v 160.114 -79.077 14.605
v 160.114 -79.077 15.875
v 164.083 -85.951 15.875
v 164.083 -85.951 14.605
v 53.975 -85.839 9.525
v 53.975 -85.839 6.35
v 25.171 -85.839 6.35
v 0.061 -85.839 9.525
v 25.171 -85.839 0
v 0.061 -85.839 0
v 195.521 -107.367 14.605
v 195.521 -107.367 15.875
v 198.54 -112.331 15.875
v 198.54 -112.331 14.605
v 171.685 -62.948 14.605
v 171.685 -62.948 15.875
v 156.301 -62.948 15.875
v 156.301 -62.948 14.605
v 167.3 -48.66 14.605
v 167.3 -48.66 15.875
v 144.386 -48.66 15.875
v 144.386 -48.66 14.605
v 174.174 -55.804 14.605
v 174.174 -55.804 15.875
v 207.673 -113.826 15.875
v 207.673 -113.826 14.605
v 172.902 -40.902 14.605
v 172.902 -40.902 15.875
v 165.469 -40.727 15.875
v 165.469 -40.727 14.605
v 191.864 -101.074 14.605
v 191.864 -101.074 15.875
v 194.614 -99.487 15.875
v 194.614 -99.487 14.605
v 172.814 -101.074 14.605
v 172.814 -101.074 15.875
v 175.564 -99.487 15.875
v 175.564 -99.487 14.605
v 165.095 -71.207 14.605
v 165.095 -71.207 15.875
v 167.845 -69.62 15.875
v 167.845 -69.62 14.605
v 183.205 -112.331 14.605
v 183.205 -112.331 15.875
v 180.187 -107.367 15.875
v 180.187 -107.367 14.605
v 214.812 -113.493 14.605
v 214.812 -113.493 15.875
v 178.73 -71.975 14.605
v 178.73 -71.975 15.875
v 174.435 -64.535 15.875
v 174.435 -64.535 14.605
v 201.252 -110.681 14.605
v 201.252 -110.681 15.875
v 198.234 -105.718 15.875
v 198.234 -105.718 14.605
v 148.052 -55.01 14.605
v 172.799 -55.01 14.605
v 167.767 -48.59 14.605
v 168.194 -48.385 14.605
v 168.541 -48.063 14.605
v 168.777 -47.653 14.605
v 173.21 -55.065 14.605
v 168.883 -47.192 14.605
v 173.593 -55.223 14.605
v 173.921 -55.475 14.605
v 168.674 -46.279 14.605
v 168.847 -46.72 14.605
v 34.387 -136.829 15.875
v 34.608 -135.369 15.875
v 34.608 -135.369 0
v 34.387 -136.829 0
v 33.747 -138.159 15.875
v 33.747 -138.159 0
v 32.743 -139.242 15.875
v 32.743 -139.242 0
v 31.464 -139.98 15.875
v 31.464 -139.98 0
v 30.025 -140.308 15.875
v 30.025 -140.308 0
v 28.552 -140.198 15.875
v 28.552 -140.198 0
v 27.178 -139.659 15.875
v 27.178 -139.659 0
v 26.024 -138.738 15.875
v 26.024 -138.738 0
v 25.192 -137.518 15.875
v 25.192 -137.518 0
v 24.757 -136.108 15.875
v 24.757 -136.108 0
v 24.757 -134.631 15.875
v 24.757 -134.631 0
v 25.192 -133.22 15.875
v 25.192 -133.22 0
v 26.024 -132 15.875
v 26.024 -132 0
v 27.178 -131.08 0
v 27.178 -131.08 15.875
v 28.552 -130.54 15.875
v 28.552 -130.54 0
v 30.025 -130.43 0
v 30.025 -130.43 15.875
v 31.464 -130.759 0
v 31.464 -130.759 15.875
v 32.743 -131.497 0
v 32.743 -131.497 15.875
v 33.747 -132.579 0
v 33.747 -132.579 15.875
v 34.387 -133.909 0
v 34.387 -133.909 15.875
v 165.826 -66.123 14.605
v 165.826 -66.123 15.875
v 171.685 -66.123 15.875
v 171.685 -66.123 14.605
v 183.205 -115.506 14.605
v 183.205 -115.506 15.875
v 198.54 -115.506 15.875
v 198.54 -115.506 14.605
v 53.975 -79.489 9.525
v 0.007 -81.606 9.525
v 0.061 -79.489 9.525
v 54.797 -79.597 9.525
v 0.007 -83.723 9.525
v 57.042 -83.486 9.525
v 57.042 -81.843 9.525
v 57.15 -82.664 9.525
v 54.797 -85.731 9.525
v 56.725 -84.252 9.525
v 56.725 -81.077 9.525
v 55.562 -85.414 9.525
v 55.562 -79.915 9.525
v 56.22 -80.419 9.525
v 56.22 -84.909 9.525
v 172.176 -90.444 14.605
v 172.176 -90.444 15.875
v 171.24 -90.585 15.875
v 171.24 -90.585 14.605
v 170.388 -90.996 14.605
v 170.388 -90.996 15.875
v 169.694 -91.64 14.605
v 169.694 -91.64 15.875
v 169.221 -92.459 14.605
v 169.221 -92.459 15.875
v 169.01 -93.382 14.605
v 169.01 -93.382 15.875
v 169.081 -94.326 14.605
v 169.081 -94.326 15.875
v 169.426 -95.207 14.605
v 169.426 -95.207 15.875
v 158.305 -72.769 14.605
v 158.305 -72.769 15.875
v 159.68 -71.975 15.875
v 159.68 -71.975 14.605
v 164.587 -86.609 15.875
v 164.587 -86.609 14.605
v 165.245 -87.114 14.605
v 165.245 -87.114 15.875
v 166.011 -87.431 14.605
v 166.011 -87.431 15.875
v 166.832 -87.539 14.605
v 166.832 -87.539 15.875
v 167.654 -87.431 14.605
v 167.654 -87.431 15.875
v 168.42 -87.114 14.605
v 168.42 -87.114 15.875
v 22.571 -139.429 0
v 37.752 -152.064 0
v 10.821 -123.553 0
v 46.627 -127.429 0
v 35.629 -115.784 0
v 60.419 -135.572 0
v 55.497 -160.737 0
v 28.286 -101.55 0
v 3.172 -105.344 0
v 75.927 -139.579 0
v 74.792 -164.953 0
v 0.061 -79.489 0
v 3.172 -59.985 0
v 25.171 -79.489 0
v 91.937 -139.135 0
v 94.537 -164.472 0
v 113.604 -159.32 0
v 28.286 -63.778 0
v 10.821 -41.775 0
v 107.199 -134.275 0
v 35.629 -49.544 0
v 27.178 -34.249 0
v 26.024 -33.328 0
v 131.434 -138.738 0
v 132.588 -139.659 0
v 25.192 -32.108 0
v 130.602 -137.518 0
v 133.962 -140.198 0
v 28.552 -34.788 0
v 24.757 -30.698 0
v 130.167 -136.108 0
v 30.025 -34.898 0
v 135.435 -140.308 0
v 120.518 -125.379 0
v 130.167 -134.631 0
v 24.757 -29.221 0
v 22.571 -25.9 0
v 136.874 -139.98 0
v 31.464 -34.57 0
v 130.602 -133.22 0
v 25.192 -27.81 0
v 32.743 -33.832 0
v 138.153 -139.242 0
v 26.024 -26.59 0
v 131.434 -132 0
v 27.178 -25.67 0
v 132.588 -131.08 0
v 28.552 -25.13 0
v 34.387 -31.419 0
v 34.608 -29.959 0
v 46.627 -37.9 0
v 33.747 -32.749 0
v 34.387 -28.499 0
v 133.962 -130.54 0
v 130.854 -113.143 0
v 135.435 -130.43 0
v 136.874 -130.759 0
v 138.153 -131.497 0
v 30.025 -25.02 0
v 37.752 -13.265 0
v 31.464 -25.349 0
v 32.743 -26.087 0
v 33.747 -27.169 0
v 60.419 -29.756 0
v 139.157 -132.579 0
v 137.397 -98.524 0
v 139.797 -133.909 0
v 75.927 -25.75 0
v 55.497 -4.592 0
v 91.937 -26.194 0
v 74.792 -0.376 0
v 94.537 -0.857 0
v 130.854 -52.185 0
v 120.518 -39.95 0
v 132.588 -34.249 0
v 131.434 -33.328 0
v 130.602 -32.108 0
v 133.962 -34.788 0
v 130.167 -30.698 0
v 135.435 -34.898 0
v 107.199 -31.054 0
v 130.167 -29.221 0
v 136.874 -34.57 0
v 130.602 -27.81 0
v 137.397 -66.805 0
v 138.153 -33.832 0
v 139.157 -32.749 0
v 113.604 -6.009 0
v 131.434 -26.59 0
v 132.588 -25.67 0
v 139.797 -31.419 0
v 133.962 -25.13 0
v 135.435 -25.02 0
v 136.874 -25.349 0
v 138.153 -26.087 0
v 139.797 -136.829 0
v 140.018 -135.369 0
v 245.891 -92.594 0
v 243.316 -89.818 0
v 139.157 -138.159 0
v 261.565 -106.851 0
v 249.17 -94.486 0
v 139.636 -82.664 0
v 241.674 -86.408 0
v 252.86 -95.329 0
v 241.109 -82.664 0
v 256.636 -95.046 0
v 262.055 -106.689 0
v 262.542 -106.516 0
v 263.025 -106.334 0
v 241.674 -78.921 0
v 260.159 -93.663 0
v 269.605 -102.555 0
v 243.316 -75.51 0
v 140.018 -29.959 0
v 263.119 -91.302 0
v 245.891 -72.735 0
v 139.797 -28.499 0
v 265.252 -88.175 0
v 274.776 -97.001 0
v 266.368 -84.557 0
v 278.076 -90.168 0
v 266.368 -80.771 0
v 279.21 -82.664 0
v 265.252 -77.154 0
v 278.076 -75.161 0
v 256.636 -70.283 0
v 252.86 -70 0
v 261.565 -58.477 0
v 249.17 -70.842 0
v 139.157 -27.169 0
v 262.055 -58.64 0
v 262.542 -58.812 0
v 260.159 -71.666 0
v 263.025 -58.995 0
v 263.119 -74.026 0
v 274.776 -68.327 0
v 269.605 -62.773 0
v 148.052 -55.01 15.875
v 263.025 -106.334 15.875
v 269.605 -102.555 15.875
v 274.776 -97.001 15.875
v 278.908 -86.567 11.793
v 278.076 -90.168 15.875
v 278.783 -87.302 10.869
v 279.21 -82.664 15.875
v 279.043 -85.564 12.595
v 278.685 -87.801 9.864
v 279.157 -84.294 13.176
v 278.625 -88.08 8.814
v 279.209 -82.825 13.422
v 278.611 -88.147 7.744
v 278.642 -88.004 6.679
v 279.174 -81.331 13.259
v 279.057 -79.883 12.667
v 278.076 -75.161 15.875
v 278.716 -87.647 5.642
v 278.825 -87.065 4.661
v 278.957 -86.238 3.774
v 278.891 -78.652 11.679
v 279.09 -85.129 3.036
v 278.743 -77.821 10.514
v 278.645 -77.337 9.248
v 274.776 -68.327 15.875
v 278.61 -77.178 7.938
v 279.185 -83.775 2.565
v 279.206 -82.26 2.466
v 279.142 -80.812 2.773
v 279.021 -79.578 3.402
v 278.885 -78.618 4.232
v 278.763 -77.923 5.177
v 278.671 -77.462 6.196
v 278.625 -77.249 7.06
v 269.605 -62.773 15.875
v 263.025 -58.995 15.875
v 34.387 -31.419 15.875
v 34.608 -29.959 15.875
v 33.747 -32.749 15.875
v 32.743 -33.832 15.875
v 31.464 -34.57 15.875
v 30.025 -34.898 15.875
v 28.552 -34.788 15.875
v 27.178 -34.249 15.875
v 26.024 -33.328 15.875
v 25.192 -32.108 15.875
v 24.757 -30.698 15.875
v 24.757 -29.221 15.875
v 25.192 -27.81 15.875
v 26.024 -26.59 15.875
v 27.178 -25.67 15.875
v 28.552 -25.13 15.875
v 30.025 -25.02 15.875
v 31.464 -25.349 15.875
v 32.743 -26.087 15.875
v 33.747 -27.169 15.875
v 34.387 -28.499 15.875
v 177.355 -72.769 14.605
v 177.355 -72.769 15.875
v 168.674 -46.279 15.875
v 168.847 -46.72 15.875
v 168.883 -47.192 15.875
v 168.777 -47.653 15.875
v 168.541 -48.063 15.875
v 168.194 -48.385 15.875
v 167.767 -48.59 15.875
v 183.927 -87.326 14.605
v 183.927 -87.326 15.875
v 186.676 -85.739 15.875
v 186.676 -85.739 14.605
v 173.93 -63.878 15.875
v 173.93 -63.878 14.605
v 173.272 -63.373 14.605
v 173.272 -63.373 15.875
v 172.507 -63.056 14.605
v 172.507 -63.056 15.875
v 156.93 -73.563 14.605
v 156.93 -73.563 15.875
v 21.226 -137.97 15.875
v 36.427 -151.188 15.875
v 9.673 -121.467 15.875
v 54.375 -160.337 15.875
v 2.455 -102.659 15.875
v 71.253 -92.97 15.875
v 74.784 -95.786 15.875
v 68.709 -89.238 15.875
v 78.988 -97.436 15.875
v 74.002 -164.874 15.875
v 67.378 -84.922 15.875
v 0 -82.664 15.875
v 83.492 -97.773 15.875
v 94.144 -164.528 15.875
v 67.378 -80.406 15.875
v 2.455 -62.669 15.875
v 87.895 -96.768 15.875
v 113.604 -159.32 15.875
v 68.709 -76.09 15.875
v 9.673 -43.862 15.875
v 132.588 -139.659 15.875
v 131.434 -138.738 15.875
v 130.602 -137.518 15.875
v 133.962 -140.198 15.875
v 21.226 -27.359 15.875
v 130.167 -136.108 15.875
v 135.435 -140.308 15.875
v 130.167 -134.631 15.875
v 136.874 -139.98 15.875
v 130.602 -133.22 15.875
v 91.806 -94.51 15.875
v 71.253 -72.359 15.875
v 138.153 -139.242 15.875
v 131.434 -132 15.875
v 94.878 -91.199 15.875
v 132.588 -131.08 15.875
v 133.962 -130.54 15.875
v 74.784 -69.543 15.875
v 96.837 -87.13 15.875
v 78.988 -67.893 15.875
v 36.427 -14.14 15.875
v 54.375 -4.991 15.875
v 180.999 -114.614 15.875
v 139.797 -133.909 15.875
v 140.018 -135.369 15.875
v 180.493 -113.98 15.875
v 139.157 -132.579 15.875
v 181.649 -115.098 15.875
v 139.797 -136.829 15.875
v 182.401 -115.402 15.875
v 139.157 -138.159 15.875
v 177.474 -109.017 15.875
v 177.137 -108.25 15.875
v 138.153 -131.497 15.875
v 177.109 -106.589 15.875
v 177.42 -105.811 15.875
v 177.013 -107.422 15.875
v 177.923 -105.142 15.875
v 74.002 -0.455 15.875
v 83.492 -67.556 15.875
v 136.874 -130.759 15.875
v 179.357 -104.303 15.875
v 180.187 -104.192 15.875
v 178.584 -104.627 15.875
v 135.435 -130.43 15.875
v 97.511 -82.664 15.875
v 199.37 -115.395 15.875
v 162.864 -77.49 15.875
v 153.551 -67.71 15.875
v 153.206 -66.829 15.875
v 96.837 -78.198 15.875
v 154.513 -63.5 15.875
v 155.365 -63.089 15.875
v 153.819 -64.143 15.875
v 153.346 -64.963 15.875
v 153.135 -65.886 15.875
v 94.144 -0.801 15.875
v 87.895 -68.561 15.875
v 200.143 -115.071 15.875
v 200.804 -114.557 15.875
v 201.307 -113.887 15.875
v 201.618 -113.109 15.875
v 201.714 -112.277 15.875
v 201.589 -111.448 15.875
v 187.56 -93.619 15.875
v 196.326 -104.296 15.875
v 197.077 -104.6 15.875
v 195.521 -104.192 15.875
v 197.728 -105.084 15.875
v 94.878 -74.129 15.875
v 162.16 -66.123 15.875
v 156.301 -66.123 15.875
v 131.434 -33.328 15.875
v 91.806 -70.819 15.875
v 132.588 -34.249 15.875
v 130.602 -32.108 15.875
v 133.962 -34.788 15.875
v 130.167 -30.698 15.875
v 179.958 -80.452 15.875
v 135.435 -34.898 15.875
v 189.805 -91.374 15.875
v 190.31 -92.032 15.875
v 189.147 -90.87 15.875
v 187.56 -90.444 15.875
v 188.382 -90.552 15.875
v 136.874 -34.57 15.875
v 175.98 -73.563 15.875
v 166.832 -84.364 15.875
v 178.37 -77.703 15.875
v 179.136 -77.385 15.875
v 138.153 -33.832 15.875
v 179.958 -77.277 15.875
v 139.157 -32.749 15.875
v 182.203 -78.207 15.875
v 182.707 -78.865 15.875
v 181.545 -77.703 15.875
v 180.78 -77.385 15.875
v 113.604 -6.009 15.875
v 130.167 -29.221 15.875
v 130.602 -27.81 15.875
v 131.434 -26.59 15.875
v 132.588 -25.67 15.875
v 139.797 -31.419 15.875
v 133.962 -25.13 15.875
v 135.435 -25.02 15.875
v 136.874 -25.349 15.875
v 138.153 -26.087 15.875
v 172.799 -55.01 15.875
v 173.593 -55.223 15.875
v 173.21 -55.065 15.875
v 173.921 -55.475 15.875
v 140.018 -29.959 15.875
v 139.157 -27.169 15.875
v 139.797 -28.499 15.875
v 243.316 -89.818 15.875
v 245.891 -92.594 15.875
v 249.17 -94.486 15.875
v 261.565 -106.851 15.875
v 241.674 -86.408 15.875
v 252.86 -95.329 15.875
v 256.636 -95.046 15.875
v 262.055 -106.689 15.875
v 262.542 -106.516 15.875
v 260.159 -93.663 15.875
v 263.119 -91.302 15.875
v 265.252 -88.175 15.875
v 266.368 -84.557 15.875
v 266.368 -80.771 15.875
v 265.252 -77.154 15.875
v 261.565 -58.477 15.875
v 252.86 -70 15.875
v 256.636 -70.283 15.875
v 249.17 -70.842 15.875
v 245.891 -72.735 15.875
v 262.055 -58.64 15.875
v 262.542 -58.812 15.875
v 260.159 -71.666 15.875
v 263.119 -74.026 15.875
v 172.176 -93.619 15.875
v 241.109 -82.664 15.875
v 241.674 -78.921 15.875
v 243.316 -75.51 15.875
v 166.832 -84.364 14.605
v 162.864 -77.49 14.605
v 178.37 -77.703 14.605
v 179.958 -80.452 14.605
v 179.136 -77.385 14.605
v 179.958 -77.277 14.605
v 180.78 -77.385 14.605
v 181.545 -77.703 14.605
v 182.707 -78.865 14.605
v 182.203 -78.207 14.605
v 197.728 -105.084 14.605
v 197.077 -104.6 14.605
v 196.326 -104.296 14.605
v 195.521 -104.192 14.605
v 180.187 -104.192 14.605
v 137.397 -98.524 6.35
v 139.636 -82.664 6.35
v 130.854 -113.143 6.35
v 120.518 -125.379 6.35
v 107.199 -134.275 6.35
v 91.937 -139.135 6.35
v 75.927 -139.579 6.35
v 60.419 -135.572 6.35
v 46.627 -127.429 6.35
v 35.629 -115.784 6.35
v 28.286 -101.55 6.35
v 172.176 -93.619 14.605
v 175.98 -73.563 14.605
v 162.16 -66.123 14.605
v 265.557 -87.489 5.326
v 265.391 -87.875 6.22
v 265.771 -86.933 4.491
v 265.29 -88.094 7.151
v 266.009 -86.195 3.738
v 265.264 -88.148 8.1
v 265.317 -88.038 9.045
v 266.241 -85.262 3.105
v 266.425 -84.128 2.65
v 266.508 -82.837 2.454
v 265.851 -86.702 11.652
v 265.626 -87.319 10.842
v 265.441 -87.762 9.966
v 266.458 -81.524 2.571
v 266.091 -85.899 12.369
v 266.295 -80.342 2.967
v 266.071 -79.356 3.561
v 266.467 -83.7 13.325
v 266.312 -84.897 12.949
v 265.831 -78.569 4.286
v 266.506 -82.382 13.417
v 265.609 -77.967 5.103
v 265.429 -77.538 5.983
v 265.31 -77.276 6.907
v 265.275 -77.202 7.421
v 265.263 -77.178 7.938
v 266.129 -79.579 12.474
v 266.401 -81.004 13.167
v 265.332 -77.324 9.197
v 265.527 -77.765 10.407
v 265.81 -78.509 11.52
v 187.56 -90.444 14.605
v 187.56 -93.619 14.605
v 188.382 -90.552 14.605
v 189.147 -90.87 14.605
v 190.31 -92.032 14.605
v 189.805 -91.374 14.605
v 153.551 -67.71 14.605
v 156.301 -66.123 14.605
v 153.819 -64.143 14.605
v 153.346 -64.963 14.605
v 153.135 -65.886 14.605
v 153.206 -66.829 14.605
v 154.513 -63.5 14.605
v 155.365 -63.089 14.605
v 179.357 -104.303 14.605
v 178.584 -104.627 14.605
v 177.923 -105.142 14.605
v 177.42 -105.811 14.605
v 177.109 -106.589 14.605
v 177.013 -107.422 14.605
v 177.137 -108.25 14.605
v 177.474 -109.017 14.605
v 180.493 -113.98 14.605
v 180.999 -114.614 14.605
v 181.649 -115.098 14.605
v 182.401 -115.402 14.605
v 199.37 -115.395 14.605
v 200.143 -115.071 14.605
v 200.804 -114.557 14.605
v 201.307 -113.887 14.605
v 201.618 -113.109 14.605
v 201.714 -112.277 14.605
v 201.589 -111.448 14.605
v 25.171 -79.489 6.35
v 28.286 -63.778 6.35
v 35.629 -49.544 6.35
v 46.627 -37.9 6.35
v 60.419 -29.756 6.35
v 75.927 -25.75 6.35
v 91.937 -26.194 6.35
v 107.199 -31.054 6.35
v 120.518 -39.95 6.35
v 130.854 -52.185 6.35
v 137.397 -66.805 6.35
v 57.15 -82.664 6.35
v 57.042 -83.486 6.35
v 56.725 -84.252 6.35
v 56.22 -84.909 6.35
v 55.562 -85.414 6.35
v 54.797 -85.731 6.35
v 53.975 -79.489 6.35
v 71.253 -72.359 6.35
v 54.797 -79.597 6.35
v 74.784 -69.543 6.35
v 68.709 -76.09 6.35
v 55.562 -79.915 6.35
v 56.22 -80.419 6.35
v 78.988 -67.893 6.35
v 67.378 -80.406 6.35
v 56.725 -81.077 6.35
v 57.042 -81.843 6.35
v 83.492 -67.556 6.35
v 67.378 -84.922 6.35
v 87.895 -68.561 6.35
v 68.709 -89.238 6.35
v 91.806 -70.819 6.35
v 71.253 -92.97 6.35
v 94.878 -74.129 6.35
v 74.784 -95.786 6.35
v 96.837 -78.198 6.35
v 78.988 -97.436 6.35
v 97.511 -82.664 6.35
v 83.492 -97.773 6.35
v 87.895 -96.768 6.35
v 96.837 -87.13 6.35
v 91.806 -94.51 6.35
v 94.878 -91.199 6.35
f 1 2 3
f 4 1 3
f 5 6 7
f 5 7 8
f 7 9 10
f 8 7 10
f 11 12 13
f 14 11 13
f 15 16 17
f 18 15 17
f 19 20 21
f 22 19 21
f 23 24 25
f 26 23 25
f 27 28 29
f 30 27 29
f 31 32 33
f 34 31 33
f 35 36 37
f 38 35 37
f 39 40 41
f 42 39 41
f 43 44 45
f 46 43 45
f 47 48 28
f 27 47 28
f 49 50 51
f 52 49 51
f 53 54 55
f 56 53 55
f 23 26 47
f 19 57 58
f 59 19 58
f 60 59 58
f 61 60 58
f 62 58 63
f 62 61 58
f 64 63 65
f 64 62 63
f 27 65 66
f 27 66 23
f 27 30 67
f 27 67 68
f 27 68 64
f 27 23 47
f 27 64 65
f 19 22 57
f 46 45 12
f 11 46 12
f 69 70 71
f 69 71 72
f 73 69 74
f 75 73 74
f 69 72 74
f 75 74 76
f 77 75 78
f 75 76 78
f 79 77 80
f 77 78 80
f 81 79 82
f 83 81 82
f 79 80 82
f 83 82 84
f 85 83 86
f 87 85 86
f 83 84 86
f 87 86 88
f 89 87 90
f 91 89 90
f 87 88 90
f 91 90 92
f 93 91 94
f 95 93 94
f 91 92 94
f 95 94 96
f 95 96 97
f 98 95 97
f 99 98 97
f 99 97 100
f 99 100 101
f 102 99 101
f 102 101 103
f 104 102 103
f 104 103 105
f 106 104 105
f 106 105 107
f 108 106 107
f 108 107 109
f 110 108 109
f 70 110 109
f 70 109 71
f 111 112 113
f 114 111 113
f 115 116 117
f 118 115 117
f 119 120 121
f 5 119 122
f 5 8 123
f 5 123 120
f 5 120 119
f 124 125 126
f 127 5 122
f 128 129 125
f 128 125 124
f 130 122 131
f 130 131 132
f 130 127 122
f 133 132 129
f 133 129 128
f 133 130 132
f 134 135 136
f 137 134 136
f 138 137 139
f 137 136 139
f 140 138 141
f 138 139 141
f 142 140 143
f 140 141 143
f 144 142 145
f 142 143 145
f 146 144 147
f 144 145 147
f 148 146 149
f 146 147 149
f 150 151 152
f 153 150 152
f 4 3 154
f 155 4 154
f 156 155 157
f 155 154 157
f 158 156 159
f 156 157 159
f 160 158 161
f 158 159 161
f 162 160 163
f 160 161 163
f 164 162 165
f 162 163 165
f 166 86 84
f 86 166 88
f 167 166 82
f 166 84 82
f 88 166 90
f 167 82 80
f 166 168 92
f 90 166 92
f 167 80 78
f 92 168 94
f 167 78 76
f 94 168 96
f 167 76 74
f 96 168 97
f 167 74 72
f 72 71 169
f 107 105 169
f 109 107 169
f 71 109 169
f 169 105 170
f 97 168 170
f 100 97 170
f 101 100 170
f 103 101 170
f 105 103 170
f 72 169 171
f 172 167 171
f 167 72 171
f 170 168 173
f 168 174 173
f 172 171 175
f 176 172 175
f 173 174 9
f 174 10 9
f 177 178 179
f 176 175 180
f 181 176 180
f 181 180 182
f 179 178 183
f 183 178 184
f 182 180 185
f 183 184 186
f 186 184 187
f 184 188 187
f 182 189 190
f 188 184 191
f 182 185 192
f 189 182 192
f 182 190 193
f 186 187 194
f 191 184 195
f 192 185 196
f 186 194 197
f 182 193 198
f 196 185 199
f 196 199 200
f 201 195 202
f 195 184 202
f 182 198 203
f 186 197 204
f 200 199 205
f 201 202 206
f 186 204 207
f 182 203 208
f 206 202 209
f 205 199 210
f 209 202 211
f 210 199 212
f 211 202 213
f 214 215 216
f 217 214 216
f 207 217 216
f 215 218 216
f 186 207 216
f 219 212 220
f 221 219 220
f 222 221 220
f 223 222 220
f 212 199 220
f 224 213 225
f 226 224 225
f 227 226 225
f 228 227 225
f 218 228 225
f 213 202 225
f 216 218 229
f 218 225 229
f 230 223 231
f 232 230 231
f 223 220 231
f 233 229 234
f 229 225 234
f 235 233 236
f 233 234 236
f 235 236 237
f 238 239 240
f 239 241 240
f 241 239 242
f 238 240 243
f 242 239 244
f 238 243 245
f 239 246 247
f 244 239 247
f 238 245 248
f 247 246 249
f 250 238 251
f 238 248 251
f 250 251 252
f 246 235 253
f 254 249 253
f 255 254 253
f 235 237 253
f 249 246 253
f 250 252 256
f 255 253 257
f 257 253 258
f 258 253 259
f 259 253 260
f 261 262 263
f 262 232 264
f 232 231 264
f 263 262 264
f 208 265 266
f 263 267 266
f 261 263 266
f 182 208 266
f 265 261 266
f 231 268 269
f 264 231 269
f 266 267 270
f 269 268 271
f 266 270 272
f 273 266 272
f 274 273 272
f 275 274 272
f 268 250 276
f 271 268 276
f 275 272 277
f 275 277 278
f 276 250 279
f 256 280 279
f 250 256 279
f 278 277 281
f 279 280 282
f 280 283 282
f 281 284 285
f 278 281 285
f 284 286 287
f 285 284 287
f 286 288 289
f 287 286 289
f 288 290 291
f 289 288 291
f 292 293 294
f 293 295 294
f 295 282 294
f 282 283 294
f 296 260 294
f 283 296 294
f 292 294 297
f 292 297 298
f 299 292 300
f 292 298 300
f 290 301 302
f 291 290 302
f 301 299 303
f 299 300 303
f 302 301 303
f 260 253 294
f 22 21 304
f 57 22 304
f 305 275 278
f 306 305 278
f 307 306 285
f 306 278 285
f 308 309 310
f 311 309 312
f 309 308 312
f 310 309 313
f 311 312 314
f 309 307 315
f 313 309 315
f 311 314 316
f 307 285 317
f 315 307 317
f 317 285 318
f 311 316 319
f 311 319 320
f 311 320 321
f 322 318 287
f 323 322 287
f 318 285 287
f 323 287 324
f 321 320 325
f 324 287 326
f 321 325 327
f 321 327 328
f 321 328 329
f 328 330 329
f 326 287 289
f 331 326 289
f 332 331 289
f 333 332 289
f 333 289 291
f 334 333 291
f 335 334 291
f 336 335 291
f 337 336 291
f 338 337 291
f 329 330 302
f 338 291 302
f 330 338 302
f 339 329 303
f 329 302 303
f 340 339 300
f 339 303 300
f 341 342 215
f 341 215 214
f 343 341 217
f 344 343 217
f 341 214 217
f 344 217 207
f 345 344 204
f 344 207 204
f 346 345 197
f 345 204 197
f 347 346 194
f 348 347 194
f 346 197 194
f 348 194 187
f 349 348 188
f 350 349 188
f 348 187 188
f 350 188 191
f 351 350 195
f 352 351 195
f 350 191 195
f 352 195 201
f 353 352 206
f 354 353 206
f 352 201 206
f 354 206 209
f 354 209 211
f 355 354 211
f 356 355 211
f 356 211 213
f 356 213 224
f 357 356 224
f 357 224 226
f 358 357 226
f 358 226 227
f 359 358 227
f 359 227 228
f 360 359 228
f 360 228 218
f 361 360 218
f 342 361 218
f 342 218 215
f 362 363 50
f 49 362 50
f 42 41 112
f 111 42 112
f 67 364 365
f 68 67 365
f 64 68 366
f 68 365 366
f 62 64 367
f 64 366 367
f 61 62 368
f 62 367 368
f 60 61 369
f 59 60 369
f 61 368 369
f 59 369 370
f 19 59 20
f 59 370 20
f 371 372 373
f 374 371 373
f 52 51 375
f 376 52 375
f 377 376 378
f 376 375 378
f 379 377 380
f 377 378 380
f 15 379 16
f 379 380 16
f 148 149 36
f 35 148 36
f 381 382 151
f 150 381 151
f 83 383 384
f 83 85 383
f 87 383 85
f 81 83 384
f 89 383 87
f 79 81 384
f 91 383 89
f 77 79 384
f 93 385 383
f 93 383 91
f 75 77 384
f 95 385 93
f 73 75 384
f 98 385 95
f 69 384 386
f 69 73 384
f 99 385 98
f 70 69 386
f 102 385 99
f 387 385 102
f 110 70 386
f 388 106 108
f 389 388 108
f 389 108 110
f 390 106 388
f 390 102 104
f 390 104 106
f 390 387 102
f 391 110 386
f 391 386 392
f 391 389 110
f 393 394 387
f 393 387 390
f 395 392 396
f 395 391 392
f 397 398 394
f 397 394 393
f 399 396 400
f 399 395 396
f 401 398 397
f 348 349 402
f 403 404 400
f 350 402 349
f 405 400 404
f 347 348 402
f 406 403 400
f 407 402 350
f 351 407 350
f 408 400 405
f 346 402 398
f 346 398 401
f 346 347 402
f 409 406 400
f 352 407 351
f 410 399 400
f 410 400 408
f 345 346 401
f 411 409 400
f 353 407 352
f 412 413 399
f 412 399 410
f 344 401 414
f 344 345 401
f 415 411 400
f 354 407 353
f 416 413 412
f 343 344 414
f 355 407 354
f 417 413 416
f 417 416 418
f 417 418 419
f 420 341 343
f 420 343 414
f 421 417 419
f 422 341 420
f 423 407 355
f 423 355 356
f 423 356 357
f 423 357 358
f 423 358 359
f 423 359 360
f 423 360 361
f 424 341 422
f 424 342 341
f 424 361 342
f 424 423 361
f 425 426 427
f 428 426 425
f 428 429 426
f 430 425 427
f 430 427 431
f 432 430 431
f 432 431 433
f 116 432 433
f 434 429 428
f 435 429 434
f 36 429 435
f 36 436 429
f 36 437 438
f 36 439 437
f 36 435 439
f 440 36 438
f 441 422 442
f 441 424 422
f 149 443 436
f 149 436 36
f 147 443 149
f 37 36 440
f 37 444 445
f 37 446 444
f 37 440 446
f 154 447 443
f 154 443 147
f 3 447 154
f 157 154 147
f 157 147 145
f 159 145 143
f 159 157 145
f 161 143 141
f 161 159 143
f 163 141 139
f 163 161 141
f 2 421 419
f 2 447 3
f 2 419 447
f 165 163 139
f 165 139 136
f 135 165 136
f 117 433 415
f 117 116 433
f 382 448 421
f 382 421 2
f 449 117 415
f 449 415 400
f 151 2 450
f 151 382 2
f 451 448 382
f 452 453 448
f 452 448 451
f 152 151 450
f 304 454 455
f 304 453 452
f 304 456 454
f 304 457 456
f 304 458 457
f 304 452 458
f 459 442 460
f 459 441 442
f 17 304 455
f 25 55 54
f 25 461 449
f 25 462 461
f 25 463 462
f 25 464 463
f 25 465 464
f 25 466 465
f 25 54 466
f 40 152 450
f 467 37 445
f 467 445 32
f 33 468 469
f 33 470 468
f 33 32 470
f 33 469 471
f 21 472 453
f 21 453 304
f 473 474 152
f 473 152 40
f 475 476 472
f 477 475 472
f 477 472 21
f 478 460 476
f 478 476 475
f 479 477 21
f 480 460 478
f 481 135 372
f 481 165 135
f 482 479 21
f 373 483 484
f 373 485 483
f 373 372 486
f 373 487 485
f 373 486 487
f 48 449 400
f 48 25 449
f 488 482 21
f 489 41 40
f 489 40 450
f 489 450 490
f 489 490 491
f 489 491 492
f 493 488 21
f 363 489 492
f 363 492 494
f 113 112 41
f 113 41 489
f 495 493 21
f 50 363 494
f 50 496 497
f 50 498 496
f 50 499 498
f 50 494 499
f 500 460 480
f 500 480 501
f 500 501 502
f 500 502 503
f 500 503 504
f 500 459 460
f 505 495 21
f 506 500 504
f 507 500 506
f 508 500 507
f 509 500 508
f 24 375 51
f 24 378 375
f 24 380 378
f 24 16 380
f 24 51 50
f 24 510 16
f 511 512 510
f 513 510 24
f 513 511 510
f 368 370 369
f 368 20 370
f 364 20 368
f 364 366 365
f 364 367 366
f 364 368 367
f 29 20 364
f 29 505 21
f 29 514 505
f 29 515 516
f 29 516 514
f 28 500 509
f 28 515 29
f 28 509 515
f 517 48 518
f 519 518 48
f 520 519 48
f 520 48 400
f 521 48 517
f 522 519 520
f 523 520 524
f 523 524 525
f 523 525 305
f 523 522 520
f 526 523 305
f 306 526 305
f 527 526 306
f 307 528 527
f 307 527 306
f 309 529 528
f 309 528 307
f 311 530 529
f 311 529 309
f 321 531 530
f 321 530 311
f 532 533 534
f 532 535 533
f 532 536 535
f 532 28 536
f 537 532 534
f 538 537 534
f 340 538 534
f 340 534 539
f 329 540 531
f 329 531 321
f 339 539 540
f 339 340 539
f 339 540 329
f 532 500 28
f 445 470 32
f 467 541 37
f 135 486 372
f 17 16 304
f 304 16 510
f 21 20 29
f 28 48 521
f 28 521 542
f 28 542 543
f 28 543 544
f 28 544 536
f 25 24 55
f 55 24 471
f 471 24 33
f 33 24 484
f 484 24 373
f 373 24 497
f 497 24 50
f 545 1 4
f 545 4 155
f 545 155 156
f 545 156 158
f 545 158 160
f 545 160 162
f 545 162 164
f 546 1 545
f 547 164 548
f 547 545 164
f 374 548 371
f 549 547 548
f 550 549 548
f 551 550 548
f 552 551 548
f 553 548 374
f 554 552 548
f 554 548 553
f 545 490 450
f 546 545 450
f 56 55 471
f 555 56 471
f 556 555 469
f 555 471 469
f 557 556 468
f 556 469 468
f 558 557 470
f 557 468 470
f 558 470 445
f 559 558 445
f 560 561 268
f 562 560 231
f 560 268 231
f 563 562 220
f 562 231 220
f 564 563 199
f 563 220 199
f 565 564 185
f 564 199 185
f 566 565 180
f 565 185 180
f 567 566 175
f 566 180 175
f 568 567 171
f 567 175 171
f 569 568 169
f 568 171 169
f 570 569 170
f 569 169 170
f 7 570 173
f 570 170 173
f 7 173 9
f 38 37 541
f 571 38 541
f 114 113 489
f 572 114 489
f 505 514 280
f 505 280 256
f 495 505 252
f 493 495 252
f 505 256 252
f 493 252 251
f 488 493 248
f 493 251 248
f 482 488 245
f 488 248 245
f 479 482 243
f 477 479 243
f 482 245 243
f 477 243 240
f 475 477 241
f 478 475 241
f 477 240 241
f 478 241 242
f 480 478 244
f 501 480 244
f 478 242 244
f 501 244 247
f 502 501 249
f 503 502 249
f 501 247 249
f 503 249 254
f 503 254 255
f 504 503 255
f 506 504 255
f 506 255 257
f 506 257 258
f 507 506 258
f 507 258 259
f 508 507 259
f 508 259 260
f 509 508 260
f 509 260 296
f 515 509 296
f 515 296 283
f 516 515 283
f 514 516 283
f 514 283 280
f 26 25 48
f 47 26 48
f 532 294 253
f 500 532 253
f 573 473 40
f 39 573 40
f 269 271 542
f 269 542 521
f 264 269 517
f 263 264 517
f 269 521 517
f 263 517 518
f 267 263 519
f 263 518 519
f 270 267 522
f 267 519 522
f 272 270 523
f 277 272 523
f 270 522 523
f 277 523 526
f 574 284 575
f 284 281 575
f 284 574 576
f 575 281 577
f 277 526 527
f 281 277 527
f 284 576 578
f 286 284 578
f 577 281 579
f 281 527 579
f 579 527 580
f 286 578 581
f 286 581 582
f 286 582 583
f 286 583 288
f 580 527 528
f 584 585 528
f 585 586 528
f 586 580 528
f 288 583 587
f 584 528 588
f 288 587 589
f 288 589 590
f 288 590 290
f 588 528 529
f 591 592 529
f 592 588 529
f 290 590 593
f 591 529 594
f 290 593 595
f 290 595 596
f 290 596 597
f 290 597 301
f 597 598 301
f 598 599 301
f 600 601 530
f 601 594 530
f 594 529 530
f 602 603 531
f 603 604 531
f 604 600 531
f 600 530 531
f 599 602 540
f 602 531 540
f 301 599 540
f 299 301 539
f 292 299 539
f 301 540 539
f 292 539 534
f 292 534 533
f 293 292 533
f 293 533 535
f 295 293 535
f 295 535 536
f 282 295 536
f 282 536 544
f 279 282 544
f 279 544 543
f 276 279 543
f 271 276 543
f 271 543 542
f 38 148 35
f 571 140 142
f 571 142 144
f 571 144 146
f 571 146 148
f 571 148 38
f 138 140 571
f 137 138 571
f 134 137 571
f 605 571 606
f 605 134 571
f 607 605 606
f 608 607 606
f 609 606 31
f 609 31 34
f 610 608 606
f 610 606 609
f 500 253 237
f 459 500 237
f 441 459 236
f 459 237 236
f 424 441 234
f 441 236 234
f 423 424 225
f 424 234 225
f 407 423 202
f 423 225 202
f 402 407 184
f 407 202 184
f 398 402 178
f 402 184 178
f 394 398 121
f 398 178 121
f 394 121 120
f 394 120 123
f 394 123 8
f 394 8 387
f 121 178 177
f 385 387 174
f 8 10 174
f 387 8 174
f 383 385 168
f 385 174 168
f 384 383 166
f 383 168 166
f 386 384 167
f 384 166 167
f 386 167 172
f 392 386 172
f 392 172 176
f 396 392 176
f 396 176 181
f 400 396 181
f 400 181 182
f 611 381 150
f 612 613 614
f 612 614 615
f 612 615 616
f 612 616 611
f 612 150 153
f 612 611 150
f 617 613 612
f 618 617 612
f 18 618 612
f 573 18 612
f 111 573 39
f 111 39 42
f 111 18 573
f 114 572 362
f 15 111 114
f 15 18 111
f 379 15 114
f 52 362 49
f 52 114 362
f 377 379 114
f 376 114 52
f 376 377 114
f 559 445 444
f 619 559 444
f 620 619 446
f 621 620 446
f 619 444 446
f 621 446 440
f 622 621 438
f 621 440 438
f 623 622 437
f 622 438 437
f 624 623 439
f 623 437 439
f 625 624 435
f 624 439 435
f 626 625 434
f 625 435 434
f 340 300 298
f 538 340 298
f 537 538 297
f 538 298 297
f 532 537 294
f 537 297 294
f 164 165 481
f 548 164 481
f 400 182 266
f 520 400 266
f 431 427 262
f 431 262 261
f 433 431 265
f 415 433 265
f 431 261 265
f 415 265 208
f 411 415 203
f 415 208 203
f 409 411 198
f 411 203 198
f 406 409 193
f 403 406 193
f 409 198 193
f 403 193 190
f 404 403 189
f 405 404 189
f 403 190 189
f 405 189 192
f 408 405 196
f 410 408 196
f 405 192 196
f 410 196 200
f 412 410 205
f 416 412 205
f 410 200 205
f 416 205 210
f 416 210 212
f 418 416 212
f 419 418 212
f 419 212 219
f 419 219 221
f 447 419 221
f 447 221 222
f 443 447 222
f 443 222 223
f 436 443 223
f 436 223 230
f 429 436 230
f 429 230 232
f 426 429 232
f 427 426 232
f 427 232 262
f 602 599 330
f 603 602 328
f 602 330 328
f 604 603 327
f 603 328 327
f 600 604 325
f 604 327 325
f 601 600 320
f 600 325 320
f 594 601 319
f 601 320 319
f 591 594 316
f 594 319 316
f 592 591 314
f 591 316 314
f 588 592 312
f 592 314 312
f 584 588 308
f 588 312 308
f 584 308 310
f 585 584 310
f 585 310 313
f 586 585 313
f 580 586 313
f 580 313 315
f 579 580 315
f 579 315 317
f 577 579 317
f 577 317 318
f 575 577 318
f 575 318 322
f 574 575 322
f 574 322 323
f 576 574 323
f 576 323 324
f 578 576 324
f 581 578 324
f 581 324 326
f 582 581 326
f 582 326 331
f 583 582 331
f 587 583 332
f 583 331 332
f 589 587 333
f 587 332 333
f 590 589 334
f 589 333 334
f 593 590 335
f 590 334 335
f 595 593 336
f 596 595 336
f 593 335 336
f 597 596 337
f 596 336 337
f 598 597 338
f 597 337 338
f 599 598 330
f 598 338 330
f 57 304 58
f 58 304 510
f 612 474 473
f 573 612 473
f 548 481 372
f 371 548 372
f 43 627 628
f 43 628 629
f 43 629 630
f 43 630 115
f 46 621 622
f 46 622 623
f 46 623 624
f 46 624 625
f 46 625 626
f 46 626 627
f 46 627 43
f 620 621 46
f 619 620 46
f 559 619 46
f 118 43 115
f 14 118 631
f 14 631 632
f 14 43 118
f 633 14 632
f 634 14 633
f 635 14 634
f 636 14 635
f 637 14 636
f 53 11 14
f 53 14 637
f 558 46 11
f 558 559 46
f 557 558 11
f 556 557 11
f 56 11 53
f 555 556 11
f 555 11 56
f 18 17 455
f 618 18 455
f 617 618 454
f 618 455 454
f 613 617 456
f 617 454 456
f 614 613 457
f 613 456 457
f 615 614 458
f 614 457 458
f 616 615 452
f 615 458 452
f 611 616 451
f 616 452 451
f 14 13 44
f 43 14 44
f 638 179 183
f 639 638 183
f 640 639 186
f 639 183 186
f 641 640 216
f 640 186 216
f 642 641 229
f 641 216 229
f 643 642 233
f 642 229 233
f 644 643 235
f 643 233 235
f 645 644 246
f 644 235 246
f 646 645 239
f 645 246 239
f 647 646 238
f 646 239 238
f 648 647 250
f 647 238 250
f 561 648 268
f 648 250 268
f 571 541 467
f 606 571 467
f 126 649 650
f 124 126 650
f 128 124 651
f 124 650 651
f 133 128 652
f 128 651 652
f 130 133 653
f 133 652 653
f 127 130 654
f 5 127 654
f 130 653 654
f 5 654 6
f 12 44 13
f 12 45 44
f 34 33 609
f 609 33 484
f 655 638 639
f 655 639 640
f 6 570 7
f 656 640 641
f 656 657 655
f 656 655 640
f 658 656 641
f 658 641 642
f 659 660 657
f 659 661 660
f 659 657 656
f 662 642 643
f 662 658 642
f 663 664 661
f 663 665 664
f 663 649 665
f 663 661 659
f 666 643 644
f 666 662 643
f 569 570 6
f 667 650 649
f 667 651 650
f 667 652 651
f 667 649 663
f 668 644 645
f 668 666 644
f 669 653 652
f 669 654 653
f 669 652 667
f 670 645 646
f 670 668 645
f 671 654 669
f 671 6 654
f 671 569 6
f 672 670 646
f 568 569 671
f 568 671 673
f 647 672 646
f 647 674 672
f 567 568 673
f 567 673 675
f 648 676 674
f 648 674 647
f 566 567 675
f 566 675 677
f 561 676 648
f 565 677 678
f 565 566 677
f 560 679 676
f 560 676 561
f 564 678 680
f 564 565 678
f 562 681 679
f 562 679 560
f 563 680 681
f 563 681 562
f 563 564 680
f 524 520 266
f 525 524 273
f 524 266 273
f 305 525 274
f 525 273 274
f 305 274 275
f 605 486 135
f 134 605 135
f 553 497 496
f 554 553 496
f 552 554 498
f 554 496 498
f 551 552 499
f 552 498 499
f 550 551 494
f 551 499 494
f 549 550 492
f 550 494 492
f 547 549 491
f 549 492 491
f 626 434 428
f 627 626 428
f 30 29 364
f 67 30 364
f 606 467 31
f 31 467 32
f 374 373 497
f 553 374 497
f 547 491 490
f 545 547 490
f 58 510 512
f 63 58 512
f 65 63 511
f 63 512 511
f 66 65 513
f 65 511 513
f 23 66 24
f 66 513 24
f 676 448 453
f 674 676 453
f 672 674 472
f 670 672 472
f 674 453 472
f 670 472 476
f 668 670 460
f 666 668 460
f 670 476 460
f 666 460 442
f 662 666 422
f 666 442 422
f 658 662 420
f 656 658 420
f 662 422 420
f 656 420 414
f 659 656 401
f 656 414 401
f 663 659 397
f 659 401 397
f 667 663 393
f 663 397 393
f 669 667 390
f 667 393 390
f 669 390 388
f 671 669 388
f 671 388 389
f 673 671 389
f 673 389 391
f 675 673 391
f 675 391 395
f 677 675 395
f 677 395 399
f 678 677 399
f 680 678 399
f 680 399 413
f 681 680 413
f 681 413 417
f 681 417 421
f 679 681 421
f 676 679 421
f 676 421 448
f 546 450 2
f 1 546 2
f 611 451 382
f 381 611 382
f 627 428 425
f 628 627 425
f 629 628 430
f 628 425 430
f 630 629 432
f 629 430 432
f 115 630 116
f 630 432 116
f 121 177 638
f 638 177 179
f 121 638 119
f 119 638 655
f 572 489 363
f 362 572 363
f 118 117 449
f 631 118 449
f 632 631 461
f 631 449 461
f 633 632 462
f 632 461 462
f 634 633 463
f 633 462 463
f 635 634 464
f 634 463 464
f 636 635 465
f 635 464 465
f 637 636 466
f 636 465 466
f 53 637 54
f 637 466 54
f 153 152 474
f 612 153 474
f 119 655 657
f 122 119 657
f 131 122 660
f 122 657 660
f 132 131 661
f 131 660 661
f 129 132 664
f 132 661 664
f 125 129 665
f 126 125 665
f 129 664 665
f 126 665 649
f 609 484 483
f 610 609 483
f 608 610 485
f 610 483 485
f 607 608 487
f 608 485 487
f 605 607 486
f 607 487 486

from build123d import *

# Parameters (mm, degrees)
F1_DEPTH  = 15.875
F3_DEPTH  = 15.876
F4_R      = 15.1511
F5_DEPTH  = 15.876
F6_R      = 57.277
F7_DEPTH  = 6.35
F8_R      = 4.953
F9_DEPTH  = 15.876
F11_DEPTH = 9.525
F13_R     = 5.4864
F14_DEPTH = 15.875
F16_DEPTH = 1.27


with BuildPart() as f1:
    # F0 (on Top) → F1 (new body)
    with BuildSketch(Plane.XY):
        with BuildLine():
            Line((261.564905, -58.477244), (113.604486, -6.008632))
            ThreePointArc((113.604486, -6.008632), (0, -82.6643), (113.604486, -159.319968))
            Line((113.604486, -159.319968), (261.564905, -106.851356))
            Line((261.564905, -106.851356), (263.024603, -106.333729))
            ThreePointArc((263.024603, -106.333729), (279.2095, -82.6643), (263.024603, -58.994871))
            Line((263.024603, -58.994871), (261.564905, -58.477244))
        make_face()
        with BuildLine():
            ThreePointArc((263.024603, -58.994871), (262.2987, -58.724929), (261.564905, -58.477244))
            Line((261.564905, -58.477244), (263.024603, -58.994871))
        make_face()
        with BuildLine():
            Line((263.024603, -106.333729), (261.564905, -106.851356))
            ThreePointArc((261.564905, -106.851356), (262.2987, -106.603671), (263.024603, -106.333729))
        make_face()
    extrude(amount=F1_DEPTH)

    # F2 (on face) → F3 (cut, through all)
    with BuildSketch(Plane.XY.offset(15.875)):
        with BuildLine():
            ThreePointArc((266.5095, -82.6643), (253.8095, -69.9643), (241.1095, -82.6643))
            Line((241.1095, -82.6643), (266.5095, -82.6643))
        make_face()
        with BuildLine():
            Line((266.5095, -82.6643), (241.1095, -82.6643))
            ThreePointArc((241.1095, -82.6643), (253.8095, -95.3643), (266.5095, -82.6643))
        make_face()
    extrude(amount=-F3_DEPTH, mode=Mode.SUBTRACT)

    # F4 (on face) → F5 (cut, through all)
    with BuildSketch(Plane.XY.offset(15.875)):
        with Locations((82.3595, -82.6643)):
            Circle(F4_R)
    extrude(amount=-F5_DEPTH, mode=Mode.SUBTRACT)

    # F6 (on face) → F7 (cut)
    with BuildSketch(Plane(origin=(0, 0, 0), x_dir=(1, 0, 0), z_dir=(0, 0, -1))):
        with Locations((82.3595, 82.6643)):
            Circle(F6_R)
    extrude(amount=-F7_DEPTH, mode=Mode.SUBTRACT)

    # F8 (on face) → F9 (cut, through all)
    with BuildSketch(Plane(origin=(0, 0, 0), x_dir=(1, 0, 0), z_dir=(0, 0, -1))):
        with Locations((29.6545, 135.3693)):
            Circle(F8_R)
        with Locations((135.0645, 135.3693)):
            Circle(F8_R)
        with Locations((135.0645, 29.9593)):
            Circle(F8_R)
        with Locations((29.6545, 29.9593)):
            Circle(F8_R)
    extrude(amount=-F9_DEPTH, mode=Mode.SUBTRACT)

    # F10 (on face) → F11 (cut)
    with BuildSketch(Plane(origin=(0, 0, 0), x_dir=(1, 0, 0), z_dir=(0, 0, -1))):
        with BuildLine():
            ThreePointArc((57.15, 82.6643), (56.220064, 84.909364), (53.975, 85.8393))
            Line((53.975, 85.8393), (0.060996, 85.8393))
            Line((0.060996, 85.8393), (-2.488084, 85.8393))
            Line((-2.488084, 85.8393), (-2.488084, 79.4893))
            Line((-2.488084, 79.4893), (-1.513804, 79.4893))
            Line((-1.513804, 79.4893), (53.975, 79.4893))
            ThreePointArc((53.975, 79.4893), (56.220064, 80.419236), (57.15, 82.6643))
        make_face()
    extrude(amount=-F11_DEPTH, mode=Mode.SUBTRACT)

    # F13 (on offset) → F14 (cut)
    with BuildSketch(Plane.YZ.offset(279.4)):
        with Locations((-82.6643, 7.9375)):
            Circle(F13_R)
    extrude(amount=-F14_DEPTH, mode=Mode.SUBTRACT)

    # F15 (on face) → F16 (cut)
    with BuildSketch(Plane.XY.offset(15.875)):
        with BuildLine():
            Line((167.299575, -48.660433), (144.385987, -48.660433))
            Line((144.385987, -48.660433), (148.052161, -55.010433))
            Line((148.052161, -55.010433), (172.798837, -55.010433))
            ThreePointArc((172.798837, -55.010433), (173.592587, -55.223117), (174.173652, -55.804183))
            Line((174.173652, -55.804183), (207.672688, -113.826216))
            Line((207.672688, -113.826216), (214.81237, -113.492506))
            Line((214.81237, -113.492506), (172.90237, -40.902257))
            Line((172.90237, -40.902257), (165.468663, -40.726699))
            Line((165.468663, -40.726699), (168.674391, -46.279183))
            ThreePointArc((168.674391, -46.279183), (168.674391, -47.866683), (167.299575, -48.660433))
        make_face()
        with BuildLine():
            Line((165.826053, -66.122933), (171.684878, -66.122933))
            Line((171.684878, -66.122933), (175.980346, -73.562901))
            Line((175.980346, -73.562901), (177.355162, -72.769151))
            Line((177.355162, -72.769151), (178.729977, -71.975401))
            Line((178.729977, -71.975401), (174.434509, -64.535433))
            ThreePointArc((174.434509, -64.535433), (173.272378, -63.373302), (171.684878, -62.947933))
            Line((171.684878, -62.947933), (156.301053, -62.947933))
            ThreePointArc((156.301053, -62.947933), (153.551422, -64.535433), (153.551422, -67.710433))
            Line((153.551422, -67.710433), (156.930346, -73.562901))
            Line((156.930346, -73.562901), (158.305162, -72.769151))
            Line((158.305162, -72.769151), (159.679977, -71.975401))
            Line((159.679977, -71.975401), (156.301053, -66.122933))
            Line((156.301053, -66.122933), (162.159878, -66.122933))
            Line((162.159878, -66.122933), (165.095358, -71.207332))
            Line((165.095358, -71.207332), (167.844988, -69.619832))
            Line((167.844988, -69.619832), (165.826053, -66.122933))
        make_face()
        with BuildLine():
            Line((166.832487, -84.363913), (162.863737, -77.489836))
            Line((162.863737, -77.489836), (160.114107, -79.077336))
            Line((160.114107, -79.077336), (164.082857, -85.951413))
            ThreePointArc((164.082857, -85.951413), (166.010737, -87.430727), (168.419987, -87.113543))
            Line((168.419987, -87.113543), (179.957857, -80.452151))
            Line((179.957857, -80.452151), (183.926607, -87.326228))
            Line((183.926607, -87.326228), (186.676237, -85.738728))
            Line((186.676237, -85.738728), (182.707487, -78.864651))
            ThreePointArc((182.707487, -78.864651), (180.779607, -77.385337), (178.370357, -77.702521))
            Line((178.370357, -77.702521), (166.832487, -84.363913))
        make_face()
        with BuildLine():
            Line((172.176053, -93.619239), (187.559878, -93.619239))
            Line((187.559878, -93.619239), (191.864107, -101.074381))
            Line((191.864107, -101.074381), (194.613737, -99.486881))
            Line((194.613737, -99.486881), (190.309509, -92.031739))
            ThreePointArc((190.309509, -92.031739), (189.147378, -90.869609), (187.559878, -90.444239))
            Line((187.559878, -90.444239), (172.176053, -90.444239))
            ThreePointArc((172.176053, -90.444239), (169.426422, -92.031739), (169.426422, -95.206739))
            Line((169.426422, -95.206739), (172.814107, -101.074381))
            Line((172.814107, -101.074381), (175.563737, -99.486881))
            Line((175.563737, -99.486881), (172.176053, -93.619239))
        make_face()
        with BuildLine():
            Line((201.252318, -110.681192), (198.234108, -105.717761))
            ThreePointArc((198.234108, -105.717761), (197.077421, -104.599884), (195.521297, -104.192393))
            Line((195.521297, -104.192393), (180.187231, -104.192393))
            ThreePointArc((180.187231, -104.192393), (177.419723, -105.811268), (177.474421, -109.017024))
            Line((177.474421, -109.017024), (180.492631, -113.980455))
            ThreePointArc((180.492631, -113.980455), (181.649318, -115.098332), (183.205442, -115.505824))
            Line((183.205442, -115.505824), (198.539508, -115.505824))
            ThreePointArc((198.539508, -115.505824), (201.307016, -113.886948), (201.252318, -110.681192))
        make_face()
        Polygon((183.205442, -112.330824), (180.187231, -107.367393), (195.521297, -107.367393), (198.539508, -112.330824), align=None, mode=Mode.SUBTRACT)
    extrude(amount=-F16_DEPTH, mode=Mode.SUBTRACT)


solid = f1.part
